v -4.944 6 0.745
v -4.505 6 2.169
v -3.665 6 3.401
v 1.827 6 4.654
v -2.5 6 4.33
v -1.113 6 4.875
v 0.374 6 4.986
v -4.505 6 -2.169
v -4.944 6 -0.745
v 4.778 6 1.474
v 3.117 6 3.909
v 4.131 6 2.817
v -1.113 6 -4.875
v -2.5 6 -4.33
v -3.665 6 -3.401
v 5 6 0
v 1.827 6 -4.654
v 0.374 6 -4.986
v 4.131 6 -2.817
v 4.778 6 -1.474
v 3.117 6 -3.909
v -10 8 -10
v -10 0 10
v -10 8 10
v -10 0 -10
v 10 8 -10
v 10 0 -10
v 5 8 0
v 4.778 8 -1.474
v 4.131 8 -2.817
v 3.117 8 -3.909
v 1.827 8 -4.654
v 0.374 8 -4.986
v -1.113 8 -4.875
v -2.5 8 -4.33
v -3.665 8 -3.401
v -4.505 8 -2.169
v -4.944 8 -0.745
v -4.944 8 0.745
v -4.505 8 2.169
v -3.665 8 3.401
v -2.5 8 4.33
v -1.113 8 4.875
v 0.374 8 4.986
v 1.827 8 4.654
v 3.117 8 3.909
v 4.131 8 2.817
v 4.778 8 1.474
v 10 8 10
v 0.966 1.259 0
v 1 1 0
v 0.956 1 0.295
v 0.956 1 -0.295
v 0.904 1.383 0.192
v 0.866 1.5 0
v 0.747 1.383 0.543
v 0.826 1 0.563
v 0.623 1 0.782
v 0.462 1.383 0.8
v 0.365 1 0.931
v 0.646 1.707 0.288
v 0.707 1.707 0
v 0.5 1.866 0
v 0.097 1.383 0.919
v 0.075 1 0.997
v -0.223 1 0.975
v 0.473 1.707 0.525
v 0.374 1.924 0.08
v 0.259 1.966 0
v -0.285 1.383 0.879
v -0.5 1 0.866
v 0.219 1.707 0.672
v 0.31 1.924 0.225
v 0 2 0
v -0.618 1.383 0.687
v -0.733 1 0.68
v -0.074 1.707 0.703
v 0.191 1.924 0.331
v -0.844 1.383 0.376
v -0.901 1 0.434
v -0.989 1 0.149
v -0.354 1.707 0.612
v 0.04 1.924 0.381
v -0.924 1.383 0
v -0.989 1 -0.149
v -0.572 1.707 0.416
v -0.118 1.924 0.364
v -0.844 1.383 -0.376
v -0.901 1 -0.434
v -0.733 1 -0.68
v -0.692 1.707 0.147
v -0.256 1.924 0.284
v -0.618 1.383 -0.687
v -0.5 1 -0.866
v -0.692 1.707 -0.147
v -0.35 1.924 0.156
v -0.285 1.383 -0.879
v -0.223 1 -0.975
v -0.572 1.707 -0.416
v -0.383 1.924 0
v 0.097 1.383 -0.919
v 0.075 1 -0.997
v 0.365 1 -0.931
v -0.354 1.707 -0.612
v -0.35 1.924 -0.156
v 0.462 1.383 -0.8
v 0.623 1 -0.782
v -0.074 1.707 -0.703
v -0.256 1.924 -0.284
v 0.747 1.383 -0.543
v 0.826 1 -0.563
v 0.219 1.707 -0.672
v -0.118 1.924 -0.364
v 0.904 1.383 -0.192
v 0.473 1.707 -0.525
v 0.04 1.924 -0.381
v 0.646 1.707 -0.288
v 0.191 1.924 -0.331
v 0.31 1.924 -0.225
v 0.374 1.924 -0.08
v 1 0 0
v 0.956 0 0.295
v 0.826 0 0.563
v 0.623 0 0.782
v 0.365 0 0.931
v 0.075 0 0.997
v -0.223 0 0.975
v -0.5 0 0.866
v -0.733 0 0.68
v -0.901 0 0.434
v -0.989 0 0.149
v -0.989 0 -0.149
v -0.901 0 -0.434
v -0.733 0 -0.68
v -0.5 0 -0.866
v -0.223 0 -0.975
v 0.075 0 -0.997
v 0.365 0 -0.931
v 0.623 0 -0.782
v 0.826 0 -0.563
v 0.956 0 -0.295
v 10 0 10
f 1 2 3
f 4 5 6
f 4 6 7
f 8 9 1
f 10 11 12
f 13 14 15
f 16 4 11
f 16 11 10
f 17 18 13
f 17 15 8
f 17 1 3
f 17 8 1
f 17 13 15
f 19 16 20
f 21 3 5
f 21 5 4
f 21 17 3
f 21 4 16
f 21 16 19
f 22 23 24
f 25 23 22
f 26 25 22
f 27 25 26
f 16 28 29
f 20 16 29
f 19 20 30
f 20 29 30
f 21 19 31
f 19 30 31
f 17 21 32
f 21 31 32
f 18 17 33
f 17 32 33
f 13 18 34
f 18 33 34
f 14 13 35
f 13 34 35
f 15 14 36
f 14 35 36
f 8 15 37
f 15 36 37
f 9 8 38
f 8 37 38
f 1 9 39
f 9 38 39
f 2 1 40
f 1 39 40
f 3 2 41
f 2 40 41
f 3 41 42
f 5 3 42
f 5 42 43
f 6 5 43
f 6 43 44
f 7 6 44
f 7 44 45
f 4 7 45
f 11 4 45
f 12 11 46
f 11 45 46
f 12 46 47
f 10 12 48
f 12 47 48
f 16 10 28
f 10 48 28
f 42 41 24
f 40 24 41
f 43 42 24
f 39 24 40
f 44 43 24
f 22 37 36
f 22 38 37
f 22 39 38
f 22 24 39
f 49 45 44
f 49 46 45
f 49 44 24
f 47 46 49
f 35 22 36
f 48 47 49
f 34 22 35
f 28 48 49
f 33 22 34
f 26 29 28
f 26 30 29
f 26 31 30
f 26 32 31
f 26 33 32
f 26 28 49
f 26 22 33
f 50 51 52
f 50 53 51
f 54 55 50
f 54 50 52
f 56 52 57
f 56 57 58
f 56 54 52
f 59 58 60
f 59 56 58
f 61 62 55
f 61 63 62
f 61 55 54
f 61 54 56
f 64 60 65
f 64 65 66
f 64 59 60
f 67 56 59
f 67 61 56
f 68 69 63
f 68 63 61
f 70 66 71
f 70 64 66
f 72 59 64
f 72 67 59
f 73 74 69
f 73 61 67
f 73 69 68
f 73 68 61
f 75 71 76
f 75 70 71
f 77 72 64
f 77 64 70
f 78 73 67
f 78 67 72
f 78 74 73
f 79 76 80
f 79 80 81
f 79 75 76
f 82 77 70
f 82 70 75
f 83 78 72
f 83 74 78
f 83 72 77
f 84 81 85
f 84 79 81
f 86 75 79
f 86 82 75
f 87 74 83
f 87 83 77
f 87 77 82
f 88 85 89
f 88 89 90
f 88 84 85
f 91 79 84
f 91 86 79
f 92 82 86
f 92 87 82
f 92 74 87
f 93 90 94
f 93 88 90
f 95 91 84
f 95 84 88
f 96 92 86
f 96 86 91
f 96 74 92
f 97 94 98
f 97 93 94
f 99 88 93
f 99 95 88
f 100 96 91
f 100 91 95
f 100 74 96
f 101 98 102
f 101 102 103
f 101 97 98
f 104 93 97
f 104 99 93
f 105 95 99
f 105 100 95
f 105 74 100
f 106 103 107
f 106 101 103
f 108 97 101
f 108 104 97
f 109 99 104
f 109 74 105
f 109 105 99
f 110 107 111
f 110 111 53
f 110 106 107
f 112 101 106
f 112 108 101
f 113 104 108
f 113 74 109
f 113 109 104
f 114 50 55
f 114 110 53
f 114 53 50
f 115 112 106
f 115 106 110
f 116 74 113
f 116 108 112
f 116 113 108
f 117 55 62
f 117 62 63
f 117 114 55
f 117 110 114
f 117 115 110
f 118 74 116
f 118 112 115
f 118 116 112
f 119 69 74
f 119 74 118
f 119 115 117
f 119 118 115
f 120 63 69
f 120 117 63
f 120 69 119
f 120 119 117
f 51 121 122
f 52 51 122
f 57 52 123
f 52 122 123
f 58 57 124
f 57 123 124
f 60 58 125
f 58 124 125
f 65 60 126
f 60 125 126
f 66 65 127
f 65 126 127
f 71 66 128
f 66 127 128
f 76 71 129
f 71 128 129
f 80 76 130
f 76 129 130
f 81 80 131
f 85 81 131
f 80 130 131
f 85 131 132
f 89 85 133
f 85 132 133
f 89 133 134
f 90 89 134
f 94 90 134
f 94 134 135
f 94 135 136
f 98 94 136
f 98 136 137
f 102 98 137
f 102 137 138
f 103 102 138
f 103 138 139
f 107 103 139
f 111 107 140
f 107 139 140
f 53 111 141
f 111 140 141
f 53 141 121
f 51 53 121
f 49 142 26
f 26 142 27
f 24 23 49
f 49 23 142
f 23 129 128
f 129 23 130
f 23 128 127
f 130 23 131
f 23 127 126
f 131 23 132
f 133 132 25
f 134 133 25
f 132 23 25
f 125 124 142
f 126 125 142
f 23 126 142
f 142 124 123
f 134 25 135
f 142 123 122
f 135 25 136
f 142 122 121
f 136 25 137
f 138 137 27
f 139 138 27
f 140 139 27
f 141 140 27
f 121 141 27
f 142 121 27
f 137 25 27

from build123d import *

# Parameters (mm, degrees)
SKETCH1_W           = 20
SKETCH1_H           = 20
BOSS_EXTRUDE1_DEPTH = 8
SKETCH2_R           = 5
CUT_EXTRUDE1_DEPTH  = 2
SKETCH3_R           = 1
CUT_EXTRUDE2_DEPTH  = 2
FILLET1_R           = 1


with BuildPart() as part:
    # Sketch1 → Boss-Extrude1 (new body)
    with BuildSketch(Plane(origin=(0, 0, 0), x_dir=(1, 0, 0), z_dir=(0, 1, 0))):
        Rectangle(SKETCH1_W, SKETCH1_H)
    extrude(amount=BOSS_EXTRUDE1_DEPTH)

    # Sketch2 → Cut-Extrude1 (cut)
    with BuildSketch(Plane(origin=(0, 8, 0), x_dir=(1, 0, 0), z_dir=(0, 1, 0))):
        Circle(SKETCH2_R)
    extrude(amount=-CUT_EXTRUDE1_DEPTH, mode=Mode.SUBTRACT)

    # Sketch3 → Cut-Extrude2 (cut)
    with BuildSketch(Plane.XZ):
        Circle(SKETCH3_R)
    extrude(amount=-CUT_EXTRUDE2_DEPTH, mode=Mode.SUBTRACT)

    # Fillet1
    fillet1_edges = [part.edges().sort_by_distance(p)[0] for p in [
        (-1, 2, 0),
    ]]
    fillet(fillet1_edges, radius=FILLET1_R)


solid = part.part
